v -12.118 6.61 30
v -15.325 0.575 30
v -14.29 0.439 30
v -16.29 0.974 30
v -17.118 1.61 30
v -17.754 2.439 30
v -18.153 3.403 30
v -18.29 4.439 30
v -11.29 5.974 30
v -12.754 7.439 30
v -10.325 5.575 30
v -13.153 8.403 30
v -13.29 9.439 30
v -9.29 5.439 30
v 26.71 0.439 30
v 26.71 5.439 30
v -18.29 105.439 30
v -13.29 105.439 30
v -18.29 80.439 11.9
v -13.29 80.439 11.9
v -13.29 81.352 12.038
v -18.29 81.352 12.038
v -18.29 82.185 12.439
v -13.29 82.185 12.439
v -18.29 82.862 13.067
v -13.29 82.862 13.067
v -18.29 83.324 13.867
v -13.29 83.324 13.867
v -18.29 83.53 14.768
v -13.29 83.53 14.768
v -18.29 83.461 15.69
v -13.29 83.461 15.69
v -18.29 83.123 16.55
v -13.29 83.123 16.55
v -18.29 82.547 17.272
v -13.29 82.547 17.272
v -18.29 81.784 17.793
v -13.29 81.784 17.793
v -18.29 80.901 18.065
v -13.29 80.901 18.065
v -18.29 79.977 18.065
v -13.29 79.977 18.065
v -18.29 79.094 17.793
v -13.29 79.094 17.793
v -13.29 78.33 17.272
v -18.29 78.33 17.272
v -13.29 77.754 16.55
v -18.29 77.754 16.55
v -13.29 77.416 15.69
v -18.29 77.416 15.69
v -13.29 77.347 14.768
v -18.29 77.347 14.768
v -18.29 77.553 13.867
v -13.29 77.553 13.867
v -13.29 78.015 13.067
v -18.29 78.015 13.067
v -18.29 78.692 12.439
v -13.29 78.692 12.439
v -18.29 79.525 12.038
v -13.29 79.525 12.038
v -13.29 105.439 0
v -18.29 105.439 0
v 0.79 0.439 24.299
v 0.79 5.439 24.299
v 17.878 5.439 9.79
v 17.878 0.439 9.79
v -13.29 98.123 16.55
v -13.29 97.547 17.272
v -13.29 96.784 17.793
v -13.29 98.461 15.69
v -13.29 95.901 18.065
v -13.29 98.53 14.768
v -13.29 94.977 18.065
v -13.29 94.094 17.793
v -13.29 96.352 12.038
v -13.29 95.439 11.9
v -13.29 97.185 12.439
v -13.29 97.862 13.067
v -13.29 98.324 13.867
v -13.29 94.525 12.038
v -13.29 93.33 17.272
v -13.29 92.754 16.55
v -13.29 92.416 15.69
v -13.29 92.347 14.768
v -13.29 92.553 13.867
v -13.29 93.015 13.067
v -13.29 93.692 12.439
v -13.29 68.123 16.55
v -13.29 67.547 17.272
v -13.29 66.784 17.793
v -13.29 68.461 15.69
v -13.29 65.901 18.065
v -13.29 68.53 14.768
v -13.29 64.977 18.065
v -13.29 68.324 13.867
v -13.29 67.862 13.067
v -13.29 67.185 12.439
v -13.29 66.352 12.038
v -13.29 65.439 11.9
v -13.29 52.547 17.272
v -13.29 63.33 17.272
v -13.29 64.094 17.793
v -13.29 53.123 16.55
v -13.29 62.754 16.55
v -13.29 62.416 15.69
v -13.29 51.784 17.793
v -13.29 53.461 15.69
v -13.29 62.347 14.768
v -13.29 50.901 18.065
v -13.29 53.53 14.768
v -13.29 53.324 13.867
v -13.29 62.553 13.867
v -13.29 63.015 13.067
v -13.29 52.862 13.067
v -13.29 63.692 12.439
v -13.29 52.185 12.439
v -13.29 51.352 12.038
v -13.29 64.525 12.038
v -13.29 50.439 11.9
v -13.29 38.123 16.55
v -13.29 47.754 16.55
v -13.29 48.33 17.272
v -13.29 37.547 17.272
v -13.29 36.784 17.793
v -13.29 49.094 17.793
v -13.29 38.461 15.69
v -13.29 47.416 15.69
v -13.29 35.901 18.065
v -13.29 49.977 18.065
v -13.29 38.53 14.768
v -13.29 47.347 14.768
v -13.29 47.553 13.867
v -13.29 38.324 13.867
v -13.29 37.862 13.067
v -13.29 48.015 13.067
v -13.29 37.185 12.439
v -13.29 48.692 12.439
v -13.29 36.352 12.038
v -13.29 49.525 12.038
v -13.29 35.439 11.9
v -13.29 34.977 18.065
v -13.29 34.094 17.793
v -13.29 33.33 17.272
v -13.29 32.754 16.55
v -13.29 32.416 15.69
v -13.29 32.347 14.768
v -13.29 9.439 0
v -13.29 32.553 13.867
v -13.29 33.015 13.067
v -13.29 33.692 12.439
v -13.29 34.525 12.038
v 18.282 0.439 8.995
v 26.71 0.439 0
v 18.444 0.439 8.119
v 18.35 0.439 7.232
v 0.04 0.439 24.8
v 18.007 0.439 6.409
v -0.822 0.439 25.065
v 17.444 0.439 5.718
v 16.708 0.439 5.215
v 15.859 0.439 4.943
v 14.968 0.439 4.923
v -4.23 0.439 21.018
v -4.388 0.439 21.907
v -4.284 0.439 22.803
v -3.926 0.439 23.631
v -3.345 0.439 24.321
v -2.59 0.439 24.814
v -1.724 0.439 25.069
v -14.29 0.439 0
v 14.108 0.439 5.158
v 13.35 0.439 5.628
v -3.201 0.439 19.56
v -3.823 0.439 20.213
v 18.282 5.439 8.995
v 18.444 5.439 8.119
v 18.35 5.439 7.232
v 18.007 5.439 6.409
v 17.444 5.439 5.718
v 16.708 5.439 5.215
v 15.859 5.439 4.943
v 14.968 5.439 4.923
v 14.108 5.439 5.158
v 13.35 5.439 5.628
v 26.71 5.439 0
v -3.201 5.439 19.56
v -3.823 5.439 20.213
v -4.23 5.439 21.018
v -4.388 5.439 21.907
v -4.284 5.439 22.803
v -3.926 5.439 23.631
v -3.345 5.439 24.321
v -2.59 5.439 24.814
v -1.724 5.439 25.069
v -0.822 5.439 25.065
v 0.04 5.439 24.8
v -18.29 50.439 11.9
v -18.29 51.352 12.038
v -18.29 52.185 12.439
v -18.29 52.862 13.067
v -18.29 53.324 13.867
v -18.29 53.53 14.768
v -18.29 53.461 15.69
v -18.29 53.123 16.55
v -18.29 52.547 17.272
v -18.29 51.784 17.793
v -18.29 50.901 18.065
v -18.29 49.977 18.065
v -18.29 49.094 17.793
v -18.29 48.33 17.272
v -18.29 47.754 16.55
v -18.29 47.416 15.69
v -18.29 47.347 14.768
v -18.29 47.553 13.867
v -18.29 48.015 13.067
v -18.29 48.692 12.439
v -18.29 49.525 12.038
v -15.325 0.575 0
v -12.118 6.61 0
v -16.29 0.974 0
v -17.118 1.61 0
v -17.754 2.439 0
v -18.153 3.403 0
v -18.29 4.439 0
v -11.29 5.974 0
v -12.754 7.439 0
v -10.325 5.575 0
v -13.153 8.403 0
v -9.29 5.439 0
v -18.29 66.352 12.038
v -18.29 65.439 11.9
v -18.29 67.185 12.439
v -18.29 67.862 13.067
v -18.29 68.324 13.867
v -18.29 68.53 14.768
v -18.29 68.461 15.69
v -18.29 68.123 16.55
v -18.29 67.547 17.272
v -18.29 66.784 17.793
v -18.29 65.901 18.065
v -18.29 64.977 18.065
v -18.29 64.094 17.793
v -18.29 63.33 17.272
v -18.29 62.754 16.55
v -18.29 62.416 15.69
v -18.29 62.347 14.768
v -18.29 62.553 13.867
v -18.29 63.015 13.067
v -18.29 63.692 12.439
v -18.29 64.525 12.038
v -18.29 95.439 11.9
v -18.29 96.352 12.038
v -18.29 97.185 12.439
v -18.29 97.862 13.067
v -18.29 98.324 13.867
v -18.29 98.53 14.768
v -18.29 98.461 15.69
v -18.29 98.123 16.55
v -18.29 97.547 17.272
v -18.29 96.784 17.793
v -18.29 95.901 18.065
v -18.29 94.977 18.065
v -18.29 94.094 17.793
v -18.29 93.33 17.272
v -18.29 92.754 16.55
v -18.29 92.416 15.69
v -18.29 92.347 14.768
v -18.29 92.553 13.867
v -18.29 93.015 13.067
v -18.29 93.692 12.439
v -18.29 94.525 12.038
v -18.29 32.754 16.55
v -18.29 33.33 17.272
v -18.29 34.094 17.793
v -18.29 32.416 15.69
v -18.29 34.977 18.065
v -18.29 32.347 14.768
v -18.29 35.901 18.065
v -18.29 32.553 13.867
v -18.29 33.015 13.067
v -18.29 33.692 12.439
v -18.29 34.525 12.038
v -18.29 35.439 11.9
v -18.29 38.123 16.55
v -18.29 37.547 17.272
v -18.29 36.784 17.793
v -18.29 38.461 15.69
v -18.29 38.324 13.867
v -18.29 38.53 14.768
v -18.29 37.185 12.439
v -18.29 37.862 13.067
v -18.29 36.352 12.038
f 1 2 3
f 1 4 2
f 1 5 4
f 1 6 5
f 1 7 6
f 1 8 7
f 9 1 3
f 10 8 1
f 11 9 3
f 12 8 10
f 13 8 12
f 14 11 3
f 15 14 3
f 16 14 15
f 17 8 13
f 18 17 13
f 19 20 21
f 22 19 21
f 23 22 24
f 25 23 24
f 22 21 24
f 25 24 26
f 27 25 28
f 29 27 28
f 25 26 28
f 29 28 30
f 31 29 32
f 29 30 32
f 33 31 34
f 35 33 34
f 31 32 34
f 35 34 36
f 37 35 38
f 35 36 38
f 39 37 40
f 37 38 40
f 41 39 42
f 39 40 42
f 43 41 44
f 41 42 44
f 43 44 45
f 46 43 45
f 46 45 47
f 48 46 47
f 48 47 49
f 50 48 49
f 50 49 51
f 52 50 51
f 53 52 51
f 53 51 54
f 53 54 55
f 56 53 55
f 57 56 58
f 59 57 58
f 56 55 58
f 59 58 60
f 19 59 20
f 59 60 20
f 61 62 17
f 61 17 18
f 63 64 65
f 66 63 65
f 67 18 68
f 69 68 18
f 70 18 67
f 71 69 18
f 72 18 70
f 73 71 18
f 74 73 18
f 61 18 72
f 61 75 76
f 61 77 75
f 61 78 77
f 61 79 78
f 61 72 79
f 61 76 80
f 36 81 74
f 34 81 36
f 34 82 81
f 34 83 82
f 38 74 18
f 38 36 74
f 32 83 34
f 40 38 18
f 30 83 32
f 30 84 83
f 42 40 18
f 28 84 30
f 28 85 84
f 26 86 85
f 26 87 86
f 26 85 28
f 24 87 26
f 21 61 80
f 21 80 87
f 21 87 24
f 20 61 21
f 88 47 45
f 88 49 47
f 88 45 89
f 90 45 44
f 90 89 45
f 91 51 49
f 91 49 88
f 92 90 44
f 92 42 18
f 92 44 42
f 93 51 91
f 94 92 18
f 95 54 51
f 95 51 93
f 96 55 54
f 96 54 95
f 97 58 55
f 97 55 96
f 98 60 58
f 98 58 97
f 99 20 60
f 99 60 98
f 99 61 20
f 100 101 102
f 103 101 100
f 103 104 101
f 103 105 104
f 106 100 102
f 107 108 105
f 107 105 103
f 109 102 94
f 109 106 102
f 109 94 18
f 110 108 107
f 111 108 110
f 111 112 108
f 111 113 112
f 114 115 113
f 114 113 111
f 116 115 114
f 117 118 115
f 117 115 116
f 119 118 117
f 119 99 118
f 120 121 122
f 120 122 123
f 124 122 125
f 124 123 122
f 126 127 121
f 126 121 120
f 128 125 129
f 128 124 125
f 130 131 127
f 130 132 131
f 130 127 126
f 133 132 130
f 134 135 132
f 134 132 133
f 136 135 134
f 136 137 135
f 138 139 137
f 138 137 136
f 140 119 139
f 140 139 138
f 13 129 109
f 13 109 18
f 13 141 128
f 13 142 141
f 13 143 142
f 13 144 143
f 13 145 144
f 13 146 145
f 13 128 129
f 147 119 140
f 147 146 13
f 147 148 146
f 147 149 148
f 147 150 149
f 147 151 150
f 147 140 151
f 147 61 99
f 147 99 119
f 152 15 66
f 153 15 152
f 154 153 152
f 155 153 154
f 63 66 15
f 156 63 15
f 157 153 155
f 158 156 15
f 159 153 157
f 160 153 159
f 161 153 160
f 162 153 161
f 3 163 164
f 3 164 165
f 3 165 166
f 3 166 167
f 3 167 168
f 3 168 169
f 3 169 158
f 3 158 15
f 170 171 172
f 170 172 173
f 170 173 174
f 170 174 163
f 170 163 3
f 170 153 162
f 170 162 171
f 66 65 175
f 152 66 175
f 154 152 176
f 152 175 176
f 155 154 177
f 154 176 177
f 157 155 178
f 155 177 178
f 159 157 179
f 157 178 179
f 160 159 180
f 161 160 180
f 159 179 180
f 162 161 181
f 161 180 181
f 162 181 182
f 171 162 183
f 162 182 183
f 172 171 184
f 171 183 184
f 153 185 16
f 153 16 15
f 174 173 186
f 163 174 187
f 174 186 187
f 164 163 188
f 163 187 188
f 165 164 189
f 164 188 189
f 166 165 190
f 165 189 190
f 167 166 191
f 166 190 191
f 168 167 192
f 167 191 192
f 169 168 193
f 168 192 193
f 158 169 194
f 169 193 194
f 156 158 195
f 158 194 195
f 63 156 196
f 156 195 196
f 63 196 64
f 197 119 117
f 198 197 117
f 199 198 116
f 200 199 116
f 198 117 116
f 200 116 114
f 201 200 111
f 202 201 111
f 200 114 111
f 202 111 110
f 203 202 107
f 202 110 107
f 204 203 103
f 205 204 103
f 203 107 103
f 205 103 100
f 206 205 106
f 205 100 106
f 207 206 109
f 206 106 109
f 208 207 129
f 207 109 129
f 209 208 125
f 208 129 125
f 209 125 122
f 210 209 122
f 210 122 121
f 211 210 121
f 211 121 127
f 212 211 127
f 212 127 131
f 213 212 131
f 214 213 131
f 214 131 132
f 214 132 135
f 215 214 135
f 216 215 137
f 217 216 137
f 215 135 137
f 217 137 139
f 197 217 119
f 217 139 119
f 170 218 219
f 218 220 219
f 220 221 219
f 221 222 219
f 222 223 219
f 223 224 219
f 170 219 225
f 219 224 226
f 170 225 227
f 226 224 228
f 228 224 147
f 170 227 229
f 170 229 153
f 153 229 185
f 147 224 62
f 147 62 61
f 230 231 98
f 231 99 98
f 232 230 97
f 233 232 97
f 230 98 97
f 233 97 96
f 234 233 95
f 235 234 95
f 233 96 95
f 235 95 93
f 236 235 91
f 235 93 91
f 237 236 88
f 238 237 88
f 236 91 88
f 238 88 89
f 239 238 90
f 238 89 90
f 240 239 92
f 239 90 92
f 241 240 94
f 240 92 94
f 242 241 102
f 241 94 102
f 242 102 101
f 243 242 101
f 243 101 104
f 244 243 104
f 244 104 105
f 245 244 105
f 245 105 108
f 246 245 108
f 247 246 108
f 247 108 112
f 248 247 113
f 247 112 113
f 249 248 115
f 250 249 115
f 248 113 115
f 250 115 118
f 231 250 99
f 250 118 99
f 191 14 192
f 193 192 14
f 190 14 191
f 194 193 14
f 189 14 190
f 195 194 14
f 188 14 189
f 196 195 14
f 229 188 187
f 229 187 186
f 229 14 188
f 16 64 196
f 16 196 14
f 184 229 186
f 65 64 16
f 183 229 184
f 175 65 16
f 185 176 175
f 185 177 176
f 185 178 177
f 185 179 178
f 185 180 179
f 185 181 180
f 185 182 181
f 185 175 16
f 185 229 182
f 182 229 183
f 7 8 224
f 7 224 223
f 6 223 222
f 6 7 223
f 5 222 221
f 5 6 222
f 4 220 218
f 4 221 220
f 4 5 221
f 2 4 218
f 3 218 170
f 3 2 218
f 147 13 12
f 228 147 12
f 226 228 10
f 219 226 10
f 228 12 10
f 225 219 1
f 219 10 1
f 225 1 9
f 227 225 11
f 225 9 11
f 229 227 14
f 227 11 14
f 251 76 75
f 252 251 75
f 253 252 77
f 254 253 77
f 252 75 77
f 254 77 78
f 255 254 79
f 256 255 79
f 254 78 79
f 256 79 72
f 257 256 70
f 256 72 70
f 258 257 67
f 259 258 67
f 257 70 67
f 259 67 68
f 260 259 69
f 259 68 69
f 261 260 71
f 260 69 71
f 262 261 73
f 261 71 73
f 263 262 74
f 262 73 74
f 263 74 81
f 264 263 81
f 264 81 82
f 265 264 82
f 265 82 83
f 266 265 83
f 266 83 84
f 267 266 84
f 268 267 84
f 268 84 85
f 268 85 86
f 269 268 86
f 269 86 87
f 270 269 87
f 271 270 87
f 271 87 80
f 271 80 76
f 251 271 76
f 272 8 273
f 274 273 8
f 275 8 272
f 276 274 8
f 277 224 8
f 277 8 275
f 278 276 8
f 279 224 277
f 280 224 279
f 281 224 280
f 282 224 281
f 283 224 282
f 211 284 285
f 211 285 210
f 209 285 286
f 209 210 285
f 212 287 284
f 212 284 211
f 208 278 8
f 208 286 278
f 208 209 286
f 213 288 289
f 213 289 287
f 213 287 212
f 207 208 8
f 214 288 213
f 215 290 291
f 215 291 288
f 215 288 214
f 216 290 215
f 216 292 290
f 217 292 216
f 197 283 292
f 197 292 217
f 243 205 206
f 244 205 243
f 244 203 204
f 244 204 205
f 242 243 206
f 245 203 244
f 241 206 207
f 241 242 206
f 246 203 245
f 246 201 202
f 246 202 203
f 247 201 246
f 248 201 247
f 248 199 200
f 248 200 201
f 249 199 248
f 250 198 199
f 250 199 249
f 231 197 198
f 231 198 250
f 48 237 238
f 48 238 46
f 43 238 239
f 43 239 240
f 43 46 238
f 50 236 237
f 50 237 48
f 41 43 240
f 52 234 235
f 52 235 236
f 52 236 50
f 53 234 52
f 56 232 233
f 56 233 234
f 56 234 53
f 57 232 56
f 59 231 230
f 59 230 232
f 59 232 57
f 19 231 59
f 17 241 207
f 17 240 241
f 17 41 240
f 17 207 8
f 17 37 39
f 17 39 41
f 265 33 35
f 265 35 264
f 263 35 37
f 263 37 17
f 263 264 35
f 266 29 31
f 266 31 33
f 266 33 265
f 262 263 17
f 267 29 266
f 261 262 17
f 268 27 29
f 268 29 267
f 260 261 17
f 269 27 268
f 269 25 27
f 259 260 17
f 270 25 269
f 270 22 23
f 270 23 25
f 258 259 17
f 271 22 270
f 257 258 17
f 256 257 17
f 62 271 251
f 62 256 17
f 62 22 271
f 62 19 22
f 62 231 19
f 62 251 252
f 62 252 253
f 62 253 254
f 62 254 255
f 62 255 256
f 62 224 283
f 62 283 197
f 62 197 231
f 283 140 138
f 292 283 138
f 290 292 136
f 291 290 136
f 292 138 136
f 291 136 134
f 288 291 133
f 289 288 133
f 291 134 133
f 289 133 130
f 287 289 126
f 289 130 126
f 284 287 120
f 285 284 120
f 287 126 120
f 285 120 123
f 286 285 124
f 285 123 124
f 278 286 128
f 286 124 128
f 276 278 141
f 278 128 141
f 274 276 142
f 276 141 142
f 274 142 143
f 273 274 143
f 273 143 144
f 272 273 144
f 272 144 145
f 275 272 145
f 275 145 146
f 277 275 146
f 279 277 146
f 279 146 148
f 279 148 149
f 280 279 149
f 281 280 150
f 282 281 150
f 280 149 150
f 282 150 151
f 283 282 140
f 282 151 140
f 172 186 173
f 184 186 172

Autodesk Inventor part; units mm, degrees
ref_plane "YZ Plane" through (0, 0, 0) normal (1, 0, 0) x (0, 1, 0)
ref_plane "XZ Plane" through (0, 0, 0) normal (0, 1, 0) x (-1, 0, 0)
ref_plane "XY Plane" through (0, 0, 0) normal (0, 0, 1) x (1, 0, 0)
sketch "Sketch1" plane through (0, 0, 0) normal (0, 0, 1) x (1, 0, 0)
  line L0 (-18.2895, 105.4386) -> (-13.2895, 105.4386)
  line L1 (-13.2895, 105.4386) -> (-13.2895, 5.4386)
  line L2 (-18.2895, 84.1228) -> (-18.2895, 105.4386)
  line L3 (-13.2895, 5.4386) -> (26.7105, 5.4386)
  line L4 (26.7105, 5.4386) -> (26.7105, 0.4386)
  line L5 (26.7105, 0.4386) -> (-18.2895, 0.4386)
  line L6 (-18.2895, 0.4386) -> (-18.2895, 84.1228)
  point P0 (0, 0)
  dimension "d0" = 5
  dimension "d1" = 5
  dimension "d2" = 100
  dimension "d3" = 40
extrude "Extrusion1" add sketch "Sketch1" along normal blind 30
fillet "Fillet1" radius 4 2 edges at (-18.2895, 0.4386, 15) (-13.2895, 5.4386, 15)
sketch "Sketch2" plane through (-13.2895, 105.4386, 30) normal (1, 0, 0) x (0, 0, -1)
  circle A0 centre (15, -10) radius 3.1
  line L0 (30, -96) -> (30, 0) projected
  line L1 (30, 0) -> (0, 0) projected
  circle A1 centre (15, -25) radius 3.1
  circle A2 centre (15, -40) radius 3.1
  circle A3 centre (15, -55) radius 3.1
  circle A4 centre (15, -70) radius 3.1
  point P0 (30, -105.4386)
  dimension "d7" = 6.2
  dimension "d8" = 15
  dimension "d9" = 10
  dimension "d13" = 15
extrude "Extrusion2" cut sketch "Sketch2" against normal through all
sketch "Sketch3" plane through (26.7105, 5.4386, 30) normal (0, 1, 0) x (1, 0, 0)
  arc A0 (-29.9118, 10.4403) -> (-25.9203, 5.7011) centre (-28, 8) ccw
  arc A1 (-10.0083, 19.2121) -> (-13.3603, 24.3717) centre (-11.364, 22) ccw
  line L0 (-25.9203, 5.7011) -> (-8.8328, 20.2103)
  line L1 (-30.0783, 10.3002) -> (-13.3603, 24.3717)
  line L2 (0, 30) -> (-36, 30) projected
  line L3 (0, 0) -> (-36, 0) projected
  line L4 (0, 30) -> (0, 0) projected
  line L5 (-36, 0) -> (-36, 30) projected
  point P0 (-26.7105, 30)
  dimension "d20" = 6.2
  dimension "d21" = 6.2
  dimension "d22" = 8
  dimension "d23" = 8
  dimension "d24" = 11.364
  dimension "d25" = 8
extrude "Extrusion3" cut sketch "Sketch3" against normal through all contours L1 A1 L0 A0
properties part number "Mounting Bracket"
